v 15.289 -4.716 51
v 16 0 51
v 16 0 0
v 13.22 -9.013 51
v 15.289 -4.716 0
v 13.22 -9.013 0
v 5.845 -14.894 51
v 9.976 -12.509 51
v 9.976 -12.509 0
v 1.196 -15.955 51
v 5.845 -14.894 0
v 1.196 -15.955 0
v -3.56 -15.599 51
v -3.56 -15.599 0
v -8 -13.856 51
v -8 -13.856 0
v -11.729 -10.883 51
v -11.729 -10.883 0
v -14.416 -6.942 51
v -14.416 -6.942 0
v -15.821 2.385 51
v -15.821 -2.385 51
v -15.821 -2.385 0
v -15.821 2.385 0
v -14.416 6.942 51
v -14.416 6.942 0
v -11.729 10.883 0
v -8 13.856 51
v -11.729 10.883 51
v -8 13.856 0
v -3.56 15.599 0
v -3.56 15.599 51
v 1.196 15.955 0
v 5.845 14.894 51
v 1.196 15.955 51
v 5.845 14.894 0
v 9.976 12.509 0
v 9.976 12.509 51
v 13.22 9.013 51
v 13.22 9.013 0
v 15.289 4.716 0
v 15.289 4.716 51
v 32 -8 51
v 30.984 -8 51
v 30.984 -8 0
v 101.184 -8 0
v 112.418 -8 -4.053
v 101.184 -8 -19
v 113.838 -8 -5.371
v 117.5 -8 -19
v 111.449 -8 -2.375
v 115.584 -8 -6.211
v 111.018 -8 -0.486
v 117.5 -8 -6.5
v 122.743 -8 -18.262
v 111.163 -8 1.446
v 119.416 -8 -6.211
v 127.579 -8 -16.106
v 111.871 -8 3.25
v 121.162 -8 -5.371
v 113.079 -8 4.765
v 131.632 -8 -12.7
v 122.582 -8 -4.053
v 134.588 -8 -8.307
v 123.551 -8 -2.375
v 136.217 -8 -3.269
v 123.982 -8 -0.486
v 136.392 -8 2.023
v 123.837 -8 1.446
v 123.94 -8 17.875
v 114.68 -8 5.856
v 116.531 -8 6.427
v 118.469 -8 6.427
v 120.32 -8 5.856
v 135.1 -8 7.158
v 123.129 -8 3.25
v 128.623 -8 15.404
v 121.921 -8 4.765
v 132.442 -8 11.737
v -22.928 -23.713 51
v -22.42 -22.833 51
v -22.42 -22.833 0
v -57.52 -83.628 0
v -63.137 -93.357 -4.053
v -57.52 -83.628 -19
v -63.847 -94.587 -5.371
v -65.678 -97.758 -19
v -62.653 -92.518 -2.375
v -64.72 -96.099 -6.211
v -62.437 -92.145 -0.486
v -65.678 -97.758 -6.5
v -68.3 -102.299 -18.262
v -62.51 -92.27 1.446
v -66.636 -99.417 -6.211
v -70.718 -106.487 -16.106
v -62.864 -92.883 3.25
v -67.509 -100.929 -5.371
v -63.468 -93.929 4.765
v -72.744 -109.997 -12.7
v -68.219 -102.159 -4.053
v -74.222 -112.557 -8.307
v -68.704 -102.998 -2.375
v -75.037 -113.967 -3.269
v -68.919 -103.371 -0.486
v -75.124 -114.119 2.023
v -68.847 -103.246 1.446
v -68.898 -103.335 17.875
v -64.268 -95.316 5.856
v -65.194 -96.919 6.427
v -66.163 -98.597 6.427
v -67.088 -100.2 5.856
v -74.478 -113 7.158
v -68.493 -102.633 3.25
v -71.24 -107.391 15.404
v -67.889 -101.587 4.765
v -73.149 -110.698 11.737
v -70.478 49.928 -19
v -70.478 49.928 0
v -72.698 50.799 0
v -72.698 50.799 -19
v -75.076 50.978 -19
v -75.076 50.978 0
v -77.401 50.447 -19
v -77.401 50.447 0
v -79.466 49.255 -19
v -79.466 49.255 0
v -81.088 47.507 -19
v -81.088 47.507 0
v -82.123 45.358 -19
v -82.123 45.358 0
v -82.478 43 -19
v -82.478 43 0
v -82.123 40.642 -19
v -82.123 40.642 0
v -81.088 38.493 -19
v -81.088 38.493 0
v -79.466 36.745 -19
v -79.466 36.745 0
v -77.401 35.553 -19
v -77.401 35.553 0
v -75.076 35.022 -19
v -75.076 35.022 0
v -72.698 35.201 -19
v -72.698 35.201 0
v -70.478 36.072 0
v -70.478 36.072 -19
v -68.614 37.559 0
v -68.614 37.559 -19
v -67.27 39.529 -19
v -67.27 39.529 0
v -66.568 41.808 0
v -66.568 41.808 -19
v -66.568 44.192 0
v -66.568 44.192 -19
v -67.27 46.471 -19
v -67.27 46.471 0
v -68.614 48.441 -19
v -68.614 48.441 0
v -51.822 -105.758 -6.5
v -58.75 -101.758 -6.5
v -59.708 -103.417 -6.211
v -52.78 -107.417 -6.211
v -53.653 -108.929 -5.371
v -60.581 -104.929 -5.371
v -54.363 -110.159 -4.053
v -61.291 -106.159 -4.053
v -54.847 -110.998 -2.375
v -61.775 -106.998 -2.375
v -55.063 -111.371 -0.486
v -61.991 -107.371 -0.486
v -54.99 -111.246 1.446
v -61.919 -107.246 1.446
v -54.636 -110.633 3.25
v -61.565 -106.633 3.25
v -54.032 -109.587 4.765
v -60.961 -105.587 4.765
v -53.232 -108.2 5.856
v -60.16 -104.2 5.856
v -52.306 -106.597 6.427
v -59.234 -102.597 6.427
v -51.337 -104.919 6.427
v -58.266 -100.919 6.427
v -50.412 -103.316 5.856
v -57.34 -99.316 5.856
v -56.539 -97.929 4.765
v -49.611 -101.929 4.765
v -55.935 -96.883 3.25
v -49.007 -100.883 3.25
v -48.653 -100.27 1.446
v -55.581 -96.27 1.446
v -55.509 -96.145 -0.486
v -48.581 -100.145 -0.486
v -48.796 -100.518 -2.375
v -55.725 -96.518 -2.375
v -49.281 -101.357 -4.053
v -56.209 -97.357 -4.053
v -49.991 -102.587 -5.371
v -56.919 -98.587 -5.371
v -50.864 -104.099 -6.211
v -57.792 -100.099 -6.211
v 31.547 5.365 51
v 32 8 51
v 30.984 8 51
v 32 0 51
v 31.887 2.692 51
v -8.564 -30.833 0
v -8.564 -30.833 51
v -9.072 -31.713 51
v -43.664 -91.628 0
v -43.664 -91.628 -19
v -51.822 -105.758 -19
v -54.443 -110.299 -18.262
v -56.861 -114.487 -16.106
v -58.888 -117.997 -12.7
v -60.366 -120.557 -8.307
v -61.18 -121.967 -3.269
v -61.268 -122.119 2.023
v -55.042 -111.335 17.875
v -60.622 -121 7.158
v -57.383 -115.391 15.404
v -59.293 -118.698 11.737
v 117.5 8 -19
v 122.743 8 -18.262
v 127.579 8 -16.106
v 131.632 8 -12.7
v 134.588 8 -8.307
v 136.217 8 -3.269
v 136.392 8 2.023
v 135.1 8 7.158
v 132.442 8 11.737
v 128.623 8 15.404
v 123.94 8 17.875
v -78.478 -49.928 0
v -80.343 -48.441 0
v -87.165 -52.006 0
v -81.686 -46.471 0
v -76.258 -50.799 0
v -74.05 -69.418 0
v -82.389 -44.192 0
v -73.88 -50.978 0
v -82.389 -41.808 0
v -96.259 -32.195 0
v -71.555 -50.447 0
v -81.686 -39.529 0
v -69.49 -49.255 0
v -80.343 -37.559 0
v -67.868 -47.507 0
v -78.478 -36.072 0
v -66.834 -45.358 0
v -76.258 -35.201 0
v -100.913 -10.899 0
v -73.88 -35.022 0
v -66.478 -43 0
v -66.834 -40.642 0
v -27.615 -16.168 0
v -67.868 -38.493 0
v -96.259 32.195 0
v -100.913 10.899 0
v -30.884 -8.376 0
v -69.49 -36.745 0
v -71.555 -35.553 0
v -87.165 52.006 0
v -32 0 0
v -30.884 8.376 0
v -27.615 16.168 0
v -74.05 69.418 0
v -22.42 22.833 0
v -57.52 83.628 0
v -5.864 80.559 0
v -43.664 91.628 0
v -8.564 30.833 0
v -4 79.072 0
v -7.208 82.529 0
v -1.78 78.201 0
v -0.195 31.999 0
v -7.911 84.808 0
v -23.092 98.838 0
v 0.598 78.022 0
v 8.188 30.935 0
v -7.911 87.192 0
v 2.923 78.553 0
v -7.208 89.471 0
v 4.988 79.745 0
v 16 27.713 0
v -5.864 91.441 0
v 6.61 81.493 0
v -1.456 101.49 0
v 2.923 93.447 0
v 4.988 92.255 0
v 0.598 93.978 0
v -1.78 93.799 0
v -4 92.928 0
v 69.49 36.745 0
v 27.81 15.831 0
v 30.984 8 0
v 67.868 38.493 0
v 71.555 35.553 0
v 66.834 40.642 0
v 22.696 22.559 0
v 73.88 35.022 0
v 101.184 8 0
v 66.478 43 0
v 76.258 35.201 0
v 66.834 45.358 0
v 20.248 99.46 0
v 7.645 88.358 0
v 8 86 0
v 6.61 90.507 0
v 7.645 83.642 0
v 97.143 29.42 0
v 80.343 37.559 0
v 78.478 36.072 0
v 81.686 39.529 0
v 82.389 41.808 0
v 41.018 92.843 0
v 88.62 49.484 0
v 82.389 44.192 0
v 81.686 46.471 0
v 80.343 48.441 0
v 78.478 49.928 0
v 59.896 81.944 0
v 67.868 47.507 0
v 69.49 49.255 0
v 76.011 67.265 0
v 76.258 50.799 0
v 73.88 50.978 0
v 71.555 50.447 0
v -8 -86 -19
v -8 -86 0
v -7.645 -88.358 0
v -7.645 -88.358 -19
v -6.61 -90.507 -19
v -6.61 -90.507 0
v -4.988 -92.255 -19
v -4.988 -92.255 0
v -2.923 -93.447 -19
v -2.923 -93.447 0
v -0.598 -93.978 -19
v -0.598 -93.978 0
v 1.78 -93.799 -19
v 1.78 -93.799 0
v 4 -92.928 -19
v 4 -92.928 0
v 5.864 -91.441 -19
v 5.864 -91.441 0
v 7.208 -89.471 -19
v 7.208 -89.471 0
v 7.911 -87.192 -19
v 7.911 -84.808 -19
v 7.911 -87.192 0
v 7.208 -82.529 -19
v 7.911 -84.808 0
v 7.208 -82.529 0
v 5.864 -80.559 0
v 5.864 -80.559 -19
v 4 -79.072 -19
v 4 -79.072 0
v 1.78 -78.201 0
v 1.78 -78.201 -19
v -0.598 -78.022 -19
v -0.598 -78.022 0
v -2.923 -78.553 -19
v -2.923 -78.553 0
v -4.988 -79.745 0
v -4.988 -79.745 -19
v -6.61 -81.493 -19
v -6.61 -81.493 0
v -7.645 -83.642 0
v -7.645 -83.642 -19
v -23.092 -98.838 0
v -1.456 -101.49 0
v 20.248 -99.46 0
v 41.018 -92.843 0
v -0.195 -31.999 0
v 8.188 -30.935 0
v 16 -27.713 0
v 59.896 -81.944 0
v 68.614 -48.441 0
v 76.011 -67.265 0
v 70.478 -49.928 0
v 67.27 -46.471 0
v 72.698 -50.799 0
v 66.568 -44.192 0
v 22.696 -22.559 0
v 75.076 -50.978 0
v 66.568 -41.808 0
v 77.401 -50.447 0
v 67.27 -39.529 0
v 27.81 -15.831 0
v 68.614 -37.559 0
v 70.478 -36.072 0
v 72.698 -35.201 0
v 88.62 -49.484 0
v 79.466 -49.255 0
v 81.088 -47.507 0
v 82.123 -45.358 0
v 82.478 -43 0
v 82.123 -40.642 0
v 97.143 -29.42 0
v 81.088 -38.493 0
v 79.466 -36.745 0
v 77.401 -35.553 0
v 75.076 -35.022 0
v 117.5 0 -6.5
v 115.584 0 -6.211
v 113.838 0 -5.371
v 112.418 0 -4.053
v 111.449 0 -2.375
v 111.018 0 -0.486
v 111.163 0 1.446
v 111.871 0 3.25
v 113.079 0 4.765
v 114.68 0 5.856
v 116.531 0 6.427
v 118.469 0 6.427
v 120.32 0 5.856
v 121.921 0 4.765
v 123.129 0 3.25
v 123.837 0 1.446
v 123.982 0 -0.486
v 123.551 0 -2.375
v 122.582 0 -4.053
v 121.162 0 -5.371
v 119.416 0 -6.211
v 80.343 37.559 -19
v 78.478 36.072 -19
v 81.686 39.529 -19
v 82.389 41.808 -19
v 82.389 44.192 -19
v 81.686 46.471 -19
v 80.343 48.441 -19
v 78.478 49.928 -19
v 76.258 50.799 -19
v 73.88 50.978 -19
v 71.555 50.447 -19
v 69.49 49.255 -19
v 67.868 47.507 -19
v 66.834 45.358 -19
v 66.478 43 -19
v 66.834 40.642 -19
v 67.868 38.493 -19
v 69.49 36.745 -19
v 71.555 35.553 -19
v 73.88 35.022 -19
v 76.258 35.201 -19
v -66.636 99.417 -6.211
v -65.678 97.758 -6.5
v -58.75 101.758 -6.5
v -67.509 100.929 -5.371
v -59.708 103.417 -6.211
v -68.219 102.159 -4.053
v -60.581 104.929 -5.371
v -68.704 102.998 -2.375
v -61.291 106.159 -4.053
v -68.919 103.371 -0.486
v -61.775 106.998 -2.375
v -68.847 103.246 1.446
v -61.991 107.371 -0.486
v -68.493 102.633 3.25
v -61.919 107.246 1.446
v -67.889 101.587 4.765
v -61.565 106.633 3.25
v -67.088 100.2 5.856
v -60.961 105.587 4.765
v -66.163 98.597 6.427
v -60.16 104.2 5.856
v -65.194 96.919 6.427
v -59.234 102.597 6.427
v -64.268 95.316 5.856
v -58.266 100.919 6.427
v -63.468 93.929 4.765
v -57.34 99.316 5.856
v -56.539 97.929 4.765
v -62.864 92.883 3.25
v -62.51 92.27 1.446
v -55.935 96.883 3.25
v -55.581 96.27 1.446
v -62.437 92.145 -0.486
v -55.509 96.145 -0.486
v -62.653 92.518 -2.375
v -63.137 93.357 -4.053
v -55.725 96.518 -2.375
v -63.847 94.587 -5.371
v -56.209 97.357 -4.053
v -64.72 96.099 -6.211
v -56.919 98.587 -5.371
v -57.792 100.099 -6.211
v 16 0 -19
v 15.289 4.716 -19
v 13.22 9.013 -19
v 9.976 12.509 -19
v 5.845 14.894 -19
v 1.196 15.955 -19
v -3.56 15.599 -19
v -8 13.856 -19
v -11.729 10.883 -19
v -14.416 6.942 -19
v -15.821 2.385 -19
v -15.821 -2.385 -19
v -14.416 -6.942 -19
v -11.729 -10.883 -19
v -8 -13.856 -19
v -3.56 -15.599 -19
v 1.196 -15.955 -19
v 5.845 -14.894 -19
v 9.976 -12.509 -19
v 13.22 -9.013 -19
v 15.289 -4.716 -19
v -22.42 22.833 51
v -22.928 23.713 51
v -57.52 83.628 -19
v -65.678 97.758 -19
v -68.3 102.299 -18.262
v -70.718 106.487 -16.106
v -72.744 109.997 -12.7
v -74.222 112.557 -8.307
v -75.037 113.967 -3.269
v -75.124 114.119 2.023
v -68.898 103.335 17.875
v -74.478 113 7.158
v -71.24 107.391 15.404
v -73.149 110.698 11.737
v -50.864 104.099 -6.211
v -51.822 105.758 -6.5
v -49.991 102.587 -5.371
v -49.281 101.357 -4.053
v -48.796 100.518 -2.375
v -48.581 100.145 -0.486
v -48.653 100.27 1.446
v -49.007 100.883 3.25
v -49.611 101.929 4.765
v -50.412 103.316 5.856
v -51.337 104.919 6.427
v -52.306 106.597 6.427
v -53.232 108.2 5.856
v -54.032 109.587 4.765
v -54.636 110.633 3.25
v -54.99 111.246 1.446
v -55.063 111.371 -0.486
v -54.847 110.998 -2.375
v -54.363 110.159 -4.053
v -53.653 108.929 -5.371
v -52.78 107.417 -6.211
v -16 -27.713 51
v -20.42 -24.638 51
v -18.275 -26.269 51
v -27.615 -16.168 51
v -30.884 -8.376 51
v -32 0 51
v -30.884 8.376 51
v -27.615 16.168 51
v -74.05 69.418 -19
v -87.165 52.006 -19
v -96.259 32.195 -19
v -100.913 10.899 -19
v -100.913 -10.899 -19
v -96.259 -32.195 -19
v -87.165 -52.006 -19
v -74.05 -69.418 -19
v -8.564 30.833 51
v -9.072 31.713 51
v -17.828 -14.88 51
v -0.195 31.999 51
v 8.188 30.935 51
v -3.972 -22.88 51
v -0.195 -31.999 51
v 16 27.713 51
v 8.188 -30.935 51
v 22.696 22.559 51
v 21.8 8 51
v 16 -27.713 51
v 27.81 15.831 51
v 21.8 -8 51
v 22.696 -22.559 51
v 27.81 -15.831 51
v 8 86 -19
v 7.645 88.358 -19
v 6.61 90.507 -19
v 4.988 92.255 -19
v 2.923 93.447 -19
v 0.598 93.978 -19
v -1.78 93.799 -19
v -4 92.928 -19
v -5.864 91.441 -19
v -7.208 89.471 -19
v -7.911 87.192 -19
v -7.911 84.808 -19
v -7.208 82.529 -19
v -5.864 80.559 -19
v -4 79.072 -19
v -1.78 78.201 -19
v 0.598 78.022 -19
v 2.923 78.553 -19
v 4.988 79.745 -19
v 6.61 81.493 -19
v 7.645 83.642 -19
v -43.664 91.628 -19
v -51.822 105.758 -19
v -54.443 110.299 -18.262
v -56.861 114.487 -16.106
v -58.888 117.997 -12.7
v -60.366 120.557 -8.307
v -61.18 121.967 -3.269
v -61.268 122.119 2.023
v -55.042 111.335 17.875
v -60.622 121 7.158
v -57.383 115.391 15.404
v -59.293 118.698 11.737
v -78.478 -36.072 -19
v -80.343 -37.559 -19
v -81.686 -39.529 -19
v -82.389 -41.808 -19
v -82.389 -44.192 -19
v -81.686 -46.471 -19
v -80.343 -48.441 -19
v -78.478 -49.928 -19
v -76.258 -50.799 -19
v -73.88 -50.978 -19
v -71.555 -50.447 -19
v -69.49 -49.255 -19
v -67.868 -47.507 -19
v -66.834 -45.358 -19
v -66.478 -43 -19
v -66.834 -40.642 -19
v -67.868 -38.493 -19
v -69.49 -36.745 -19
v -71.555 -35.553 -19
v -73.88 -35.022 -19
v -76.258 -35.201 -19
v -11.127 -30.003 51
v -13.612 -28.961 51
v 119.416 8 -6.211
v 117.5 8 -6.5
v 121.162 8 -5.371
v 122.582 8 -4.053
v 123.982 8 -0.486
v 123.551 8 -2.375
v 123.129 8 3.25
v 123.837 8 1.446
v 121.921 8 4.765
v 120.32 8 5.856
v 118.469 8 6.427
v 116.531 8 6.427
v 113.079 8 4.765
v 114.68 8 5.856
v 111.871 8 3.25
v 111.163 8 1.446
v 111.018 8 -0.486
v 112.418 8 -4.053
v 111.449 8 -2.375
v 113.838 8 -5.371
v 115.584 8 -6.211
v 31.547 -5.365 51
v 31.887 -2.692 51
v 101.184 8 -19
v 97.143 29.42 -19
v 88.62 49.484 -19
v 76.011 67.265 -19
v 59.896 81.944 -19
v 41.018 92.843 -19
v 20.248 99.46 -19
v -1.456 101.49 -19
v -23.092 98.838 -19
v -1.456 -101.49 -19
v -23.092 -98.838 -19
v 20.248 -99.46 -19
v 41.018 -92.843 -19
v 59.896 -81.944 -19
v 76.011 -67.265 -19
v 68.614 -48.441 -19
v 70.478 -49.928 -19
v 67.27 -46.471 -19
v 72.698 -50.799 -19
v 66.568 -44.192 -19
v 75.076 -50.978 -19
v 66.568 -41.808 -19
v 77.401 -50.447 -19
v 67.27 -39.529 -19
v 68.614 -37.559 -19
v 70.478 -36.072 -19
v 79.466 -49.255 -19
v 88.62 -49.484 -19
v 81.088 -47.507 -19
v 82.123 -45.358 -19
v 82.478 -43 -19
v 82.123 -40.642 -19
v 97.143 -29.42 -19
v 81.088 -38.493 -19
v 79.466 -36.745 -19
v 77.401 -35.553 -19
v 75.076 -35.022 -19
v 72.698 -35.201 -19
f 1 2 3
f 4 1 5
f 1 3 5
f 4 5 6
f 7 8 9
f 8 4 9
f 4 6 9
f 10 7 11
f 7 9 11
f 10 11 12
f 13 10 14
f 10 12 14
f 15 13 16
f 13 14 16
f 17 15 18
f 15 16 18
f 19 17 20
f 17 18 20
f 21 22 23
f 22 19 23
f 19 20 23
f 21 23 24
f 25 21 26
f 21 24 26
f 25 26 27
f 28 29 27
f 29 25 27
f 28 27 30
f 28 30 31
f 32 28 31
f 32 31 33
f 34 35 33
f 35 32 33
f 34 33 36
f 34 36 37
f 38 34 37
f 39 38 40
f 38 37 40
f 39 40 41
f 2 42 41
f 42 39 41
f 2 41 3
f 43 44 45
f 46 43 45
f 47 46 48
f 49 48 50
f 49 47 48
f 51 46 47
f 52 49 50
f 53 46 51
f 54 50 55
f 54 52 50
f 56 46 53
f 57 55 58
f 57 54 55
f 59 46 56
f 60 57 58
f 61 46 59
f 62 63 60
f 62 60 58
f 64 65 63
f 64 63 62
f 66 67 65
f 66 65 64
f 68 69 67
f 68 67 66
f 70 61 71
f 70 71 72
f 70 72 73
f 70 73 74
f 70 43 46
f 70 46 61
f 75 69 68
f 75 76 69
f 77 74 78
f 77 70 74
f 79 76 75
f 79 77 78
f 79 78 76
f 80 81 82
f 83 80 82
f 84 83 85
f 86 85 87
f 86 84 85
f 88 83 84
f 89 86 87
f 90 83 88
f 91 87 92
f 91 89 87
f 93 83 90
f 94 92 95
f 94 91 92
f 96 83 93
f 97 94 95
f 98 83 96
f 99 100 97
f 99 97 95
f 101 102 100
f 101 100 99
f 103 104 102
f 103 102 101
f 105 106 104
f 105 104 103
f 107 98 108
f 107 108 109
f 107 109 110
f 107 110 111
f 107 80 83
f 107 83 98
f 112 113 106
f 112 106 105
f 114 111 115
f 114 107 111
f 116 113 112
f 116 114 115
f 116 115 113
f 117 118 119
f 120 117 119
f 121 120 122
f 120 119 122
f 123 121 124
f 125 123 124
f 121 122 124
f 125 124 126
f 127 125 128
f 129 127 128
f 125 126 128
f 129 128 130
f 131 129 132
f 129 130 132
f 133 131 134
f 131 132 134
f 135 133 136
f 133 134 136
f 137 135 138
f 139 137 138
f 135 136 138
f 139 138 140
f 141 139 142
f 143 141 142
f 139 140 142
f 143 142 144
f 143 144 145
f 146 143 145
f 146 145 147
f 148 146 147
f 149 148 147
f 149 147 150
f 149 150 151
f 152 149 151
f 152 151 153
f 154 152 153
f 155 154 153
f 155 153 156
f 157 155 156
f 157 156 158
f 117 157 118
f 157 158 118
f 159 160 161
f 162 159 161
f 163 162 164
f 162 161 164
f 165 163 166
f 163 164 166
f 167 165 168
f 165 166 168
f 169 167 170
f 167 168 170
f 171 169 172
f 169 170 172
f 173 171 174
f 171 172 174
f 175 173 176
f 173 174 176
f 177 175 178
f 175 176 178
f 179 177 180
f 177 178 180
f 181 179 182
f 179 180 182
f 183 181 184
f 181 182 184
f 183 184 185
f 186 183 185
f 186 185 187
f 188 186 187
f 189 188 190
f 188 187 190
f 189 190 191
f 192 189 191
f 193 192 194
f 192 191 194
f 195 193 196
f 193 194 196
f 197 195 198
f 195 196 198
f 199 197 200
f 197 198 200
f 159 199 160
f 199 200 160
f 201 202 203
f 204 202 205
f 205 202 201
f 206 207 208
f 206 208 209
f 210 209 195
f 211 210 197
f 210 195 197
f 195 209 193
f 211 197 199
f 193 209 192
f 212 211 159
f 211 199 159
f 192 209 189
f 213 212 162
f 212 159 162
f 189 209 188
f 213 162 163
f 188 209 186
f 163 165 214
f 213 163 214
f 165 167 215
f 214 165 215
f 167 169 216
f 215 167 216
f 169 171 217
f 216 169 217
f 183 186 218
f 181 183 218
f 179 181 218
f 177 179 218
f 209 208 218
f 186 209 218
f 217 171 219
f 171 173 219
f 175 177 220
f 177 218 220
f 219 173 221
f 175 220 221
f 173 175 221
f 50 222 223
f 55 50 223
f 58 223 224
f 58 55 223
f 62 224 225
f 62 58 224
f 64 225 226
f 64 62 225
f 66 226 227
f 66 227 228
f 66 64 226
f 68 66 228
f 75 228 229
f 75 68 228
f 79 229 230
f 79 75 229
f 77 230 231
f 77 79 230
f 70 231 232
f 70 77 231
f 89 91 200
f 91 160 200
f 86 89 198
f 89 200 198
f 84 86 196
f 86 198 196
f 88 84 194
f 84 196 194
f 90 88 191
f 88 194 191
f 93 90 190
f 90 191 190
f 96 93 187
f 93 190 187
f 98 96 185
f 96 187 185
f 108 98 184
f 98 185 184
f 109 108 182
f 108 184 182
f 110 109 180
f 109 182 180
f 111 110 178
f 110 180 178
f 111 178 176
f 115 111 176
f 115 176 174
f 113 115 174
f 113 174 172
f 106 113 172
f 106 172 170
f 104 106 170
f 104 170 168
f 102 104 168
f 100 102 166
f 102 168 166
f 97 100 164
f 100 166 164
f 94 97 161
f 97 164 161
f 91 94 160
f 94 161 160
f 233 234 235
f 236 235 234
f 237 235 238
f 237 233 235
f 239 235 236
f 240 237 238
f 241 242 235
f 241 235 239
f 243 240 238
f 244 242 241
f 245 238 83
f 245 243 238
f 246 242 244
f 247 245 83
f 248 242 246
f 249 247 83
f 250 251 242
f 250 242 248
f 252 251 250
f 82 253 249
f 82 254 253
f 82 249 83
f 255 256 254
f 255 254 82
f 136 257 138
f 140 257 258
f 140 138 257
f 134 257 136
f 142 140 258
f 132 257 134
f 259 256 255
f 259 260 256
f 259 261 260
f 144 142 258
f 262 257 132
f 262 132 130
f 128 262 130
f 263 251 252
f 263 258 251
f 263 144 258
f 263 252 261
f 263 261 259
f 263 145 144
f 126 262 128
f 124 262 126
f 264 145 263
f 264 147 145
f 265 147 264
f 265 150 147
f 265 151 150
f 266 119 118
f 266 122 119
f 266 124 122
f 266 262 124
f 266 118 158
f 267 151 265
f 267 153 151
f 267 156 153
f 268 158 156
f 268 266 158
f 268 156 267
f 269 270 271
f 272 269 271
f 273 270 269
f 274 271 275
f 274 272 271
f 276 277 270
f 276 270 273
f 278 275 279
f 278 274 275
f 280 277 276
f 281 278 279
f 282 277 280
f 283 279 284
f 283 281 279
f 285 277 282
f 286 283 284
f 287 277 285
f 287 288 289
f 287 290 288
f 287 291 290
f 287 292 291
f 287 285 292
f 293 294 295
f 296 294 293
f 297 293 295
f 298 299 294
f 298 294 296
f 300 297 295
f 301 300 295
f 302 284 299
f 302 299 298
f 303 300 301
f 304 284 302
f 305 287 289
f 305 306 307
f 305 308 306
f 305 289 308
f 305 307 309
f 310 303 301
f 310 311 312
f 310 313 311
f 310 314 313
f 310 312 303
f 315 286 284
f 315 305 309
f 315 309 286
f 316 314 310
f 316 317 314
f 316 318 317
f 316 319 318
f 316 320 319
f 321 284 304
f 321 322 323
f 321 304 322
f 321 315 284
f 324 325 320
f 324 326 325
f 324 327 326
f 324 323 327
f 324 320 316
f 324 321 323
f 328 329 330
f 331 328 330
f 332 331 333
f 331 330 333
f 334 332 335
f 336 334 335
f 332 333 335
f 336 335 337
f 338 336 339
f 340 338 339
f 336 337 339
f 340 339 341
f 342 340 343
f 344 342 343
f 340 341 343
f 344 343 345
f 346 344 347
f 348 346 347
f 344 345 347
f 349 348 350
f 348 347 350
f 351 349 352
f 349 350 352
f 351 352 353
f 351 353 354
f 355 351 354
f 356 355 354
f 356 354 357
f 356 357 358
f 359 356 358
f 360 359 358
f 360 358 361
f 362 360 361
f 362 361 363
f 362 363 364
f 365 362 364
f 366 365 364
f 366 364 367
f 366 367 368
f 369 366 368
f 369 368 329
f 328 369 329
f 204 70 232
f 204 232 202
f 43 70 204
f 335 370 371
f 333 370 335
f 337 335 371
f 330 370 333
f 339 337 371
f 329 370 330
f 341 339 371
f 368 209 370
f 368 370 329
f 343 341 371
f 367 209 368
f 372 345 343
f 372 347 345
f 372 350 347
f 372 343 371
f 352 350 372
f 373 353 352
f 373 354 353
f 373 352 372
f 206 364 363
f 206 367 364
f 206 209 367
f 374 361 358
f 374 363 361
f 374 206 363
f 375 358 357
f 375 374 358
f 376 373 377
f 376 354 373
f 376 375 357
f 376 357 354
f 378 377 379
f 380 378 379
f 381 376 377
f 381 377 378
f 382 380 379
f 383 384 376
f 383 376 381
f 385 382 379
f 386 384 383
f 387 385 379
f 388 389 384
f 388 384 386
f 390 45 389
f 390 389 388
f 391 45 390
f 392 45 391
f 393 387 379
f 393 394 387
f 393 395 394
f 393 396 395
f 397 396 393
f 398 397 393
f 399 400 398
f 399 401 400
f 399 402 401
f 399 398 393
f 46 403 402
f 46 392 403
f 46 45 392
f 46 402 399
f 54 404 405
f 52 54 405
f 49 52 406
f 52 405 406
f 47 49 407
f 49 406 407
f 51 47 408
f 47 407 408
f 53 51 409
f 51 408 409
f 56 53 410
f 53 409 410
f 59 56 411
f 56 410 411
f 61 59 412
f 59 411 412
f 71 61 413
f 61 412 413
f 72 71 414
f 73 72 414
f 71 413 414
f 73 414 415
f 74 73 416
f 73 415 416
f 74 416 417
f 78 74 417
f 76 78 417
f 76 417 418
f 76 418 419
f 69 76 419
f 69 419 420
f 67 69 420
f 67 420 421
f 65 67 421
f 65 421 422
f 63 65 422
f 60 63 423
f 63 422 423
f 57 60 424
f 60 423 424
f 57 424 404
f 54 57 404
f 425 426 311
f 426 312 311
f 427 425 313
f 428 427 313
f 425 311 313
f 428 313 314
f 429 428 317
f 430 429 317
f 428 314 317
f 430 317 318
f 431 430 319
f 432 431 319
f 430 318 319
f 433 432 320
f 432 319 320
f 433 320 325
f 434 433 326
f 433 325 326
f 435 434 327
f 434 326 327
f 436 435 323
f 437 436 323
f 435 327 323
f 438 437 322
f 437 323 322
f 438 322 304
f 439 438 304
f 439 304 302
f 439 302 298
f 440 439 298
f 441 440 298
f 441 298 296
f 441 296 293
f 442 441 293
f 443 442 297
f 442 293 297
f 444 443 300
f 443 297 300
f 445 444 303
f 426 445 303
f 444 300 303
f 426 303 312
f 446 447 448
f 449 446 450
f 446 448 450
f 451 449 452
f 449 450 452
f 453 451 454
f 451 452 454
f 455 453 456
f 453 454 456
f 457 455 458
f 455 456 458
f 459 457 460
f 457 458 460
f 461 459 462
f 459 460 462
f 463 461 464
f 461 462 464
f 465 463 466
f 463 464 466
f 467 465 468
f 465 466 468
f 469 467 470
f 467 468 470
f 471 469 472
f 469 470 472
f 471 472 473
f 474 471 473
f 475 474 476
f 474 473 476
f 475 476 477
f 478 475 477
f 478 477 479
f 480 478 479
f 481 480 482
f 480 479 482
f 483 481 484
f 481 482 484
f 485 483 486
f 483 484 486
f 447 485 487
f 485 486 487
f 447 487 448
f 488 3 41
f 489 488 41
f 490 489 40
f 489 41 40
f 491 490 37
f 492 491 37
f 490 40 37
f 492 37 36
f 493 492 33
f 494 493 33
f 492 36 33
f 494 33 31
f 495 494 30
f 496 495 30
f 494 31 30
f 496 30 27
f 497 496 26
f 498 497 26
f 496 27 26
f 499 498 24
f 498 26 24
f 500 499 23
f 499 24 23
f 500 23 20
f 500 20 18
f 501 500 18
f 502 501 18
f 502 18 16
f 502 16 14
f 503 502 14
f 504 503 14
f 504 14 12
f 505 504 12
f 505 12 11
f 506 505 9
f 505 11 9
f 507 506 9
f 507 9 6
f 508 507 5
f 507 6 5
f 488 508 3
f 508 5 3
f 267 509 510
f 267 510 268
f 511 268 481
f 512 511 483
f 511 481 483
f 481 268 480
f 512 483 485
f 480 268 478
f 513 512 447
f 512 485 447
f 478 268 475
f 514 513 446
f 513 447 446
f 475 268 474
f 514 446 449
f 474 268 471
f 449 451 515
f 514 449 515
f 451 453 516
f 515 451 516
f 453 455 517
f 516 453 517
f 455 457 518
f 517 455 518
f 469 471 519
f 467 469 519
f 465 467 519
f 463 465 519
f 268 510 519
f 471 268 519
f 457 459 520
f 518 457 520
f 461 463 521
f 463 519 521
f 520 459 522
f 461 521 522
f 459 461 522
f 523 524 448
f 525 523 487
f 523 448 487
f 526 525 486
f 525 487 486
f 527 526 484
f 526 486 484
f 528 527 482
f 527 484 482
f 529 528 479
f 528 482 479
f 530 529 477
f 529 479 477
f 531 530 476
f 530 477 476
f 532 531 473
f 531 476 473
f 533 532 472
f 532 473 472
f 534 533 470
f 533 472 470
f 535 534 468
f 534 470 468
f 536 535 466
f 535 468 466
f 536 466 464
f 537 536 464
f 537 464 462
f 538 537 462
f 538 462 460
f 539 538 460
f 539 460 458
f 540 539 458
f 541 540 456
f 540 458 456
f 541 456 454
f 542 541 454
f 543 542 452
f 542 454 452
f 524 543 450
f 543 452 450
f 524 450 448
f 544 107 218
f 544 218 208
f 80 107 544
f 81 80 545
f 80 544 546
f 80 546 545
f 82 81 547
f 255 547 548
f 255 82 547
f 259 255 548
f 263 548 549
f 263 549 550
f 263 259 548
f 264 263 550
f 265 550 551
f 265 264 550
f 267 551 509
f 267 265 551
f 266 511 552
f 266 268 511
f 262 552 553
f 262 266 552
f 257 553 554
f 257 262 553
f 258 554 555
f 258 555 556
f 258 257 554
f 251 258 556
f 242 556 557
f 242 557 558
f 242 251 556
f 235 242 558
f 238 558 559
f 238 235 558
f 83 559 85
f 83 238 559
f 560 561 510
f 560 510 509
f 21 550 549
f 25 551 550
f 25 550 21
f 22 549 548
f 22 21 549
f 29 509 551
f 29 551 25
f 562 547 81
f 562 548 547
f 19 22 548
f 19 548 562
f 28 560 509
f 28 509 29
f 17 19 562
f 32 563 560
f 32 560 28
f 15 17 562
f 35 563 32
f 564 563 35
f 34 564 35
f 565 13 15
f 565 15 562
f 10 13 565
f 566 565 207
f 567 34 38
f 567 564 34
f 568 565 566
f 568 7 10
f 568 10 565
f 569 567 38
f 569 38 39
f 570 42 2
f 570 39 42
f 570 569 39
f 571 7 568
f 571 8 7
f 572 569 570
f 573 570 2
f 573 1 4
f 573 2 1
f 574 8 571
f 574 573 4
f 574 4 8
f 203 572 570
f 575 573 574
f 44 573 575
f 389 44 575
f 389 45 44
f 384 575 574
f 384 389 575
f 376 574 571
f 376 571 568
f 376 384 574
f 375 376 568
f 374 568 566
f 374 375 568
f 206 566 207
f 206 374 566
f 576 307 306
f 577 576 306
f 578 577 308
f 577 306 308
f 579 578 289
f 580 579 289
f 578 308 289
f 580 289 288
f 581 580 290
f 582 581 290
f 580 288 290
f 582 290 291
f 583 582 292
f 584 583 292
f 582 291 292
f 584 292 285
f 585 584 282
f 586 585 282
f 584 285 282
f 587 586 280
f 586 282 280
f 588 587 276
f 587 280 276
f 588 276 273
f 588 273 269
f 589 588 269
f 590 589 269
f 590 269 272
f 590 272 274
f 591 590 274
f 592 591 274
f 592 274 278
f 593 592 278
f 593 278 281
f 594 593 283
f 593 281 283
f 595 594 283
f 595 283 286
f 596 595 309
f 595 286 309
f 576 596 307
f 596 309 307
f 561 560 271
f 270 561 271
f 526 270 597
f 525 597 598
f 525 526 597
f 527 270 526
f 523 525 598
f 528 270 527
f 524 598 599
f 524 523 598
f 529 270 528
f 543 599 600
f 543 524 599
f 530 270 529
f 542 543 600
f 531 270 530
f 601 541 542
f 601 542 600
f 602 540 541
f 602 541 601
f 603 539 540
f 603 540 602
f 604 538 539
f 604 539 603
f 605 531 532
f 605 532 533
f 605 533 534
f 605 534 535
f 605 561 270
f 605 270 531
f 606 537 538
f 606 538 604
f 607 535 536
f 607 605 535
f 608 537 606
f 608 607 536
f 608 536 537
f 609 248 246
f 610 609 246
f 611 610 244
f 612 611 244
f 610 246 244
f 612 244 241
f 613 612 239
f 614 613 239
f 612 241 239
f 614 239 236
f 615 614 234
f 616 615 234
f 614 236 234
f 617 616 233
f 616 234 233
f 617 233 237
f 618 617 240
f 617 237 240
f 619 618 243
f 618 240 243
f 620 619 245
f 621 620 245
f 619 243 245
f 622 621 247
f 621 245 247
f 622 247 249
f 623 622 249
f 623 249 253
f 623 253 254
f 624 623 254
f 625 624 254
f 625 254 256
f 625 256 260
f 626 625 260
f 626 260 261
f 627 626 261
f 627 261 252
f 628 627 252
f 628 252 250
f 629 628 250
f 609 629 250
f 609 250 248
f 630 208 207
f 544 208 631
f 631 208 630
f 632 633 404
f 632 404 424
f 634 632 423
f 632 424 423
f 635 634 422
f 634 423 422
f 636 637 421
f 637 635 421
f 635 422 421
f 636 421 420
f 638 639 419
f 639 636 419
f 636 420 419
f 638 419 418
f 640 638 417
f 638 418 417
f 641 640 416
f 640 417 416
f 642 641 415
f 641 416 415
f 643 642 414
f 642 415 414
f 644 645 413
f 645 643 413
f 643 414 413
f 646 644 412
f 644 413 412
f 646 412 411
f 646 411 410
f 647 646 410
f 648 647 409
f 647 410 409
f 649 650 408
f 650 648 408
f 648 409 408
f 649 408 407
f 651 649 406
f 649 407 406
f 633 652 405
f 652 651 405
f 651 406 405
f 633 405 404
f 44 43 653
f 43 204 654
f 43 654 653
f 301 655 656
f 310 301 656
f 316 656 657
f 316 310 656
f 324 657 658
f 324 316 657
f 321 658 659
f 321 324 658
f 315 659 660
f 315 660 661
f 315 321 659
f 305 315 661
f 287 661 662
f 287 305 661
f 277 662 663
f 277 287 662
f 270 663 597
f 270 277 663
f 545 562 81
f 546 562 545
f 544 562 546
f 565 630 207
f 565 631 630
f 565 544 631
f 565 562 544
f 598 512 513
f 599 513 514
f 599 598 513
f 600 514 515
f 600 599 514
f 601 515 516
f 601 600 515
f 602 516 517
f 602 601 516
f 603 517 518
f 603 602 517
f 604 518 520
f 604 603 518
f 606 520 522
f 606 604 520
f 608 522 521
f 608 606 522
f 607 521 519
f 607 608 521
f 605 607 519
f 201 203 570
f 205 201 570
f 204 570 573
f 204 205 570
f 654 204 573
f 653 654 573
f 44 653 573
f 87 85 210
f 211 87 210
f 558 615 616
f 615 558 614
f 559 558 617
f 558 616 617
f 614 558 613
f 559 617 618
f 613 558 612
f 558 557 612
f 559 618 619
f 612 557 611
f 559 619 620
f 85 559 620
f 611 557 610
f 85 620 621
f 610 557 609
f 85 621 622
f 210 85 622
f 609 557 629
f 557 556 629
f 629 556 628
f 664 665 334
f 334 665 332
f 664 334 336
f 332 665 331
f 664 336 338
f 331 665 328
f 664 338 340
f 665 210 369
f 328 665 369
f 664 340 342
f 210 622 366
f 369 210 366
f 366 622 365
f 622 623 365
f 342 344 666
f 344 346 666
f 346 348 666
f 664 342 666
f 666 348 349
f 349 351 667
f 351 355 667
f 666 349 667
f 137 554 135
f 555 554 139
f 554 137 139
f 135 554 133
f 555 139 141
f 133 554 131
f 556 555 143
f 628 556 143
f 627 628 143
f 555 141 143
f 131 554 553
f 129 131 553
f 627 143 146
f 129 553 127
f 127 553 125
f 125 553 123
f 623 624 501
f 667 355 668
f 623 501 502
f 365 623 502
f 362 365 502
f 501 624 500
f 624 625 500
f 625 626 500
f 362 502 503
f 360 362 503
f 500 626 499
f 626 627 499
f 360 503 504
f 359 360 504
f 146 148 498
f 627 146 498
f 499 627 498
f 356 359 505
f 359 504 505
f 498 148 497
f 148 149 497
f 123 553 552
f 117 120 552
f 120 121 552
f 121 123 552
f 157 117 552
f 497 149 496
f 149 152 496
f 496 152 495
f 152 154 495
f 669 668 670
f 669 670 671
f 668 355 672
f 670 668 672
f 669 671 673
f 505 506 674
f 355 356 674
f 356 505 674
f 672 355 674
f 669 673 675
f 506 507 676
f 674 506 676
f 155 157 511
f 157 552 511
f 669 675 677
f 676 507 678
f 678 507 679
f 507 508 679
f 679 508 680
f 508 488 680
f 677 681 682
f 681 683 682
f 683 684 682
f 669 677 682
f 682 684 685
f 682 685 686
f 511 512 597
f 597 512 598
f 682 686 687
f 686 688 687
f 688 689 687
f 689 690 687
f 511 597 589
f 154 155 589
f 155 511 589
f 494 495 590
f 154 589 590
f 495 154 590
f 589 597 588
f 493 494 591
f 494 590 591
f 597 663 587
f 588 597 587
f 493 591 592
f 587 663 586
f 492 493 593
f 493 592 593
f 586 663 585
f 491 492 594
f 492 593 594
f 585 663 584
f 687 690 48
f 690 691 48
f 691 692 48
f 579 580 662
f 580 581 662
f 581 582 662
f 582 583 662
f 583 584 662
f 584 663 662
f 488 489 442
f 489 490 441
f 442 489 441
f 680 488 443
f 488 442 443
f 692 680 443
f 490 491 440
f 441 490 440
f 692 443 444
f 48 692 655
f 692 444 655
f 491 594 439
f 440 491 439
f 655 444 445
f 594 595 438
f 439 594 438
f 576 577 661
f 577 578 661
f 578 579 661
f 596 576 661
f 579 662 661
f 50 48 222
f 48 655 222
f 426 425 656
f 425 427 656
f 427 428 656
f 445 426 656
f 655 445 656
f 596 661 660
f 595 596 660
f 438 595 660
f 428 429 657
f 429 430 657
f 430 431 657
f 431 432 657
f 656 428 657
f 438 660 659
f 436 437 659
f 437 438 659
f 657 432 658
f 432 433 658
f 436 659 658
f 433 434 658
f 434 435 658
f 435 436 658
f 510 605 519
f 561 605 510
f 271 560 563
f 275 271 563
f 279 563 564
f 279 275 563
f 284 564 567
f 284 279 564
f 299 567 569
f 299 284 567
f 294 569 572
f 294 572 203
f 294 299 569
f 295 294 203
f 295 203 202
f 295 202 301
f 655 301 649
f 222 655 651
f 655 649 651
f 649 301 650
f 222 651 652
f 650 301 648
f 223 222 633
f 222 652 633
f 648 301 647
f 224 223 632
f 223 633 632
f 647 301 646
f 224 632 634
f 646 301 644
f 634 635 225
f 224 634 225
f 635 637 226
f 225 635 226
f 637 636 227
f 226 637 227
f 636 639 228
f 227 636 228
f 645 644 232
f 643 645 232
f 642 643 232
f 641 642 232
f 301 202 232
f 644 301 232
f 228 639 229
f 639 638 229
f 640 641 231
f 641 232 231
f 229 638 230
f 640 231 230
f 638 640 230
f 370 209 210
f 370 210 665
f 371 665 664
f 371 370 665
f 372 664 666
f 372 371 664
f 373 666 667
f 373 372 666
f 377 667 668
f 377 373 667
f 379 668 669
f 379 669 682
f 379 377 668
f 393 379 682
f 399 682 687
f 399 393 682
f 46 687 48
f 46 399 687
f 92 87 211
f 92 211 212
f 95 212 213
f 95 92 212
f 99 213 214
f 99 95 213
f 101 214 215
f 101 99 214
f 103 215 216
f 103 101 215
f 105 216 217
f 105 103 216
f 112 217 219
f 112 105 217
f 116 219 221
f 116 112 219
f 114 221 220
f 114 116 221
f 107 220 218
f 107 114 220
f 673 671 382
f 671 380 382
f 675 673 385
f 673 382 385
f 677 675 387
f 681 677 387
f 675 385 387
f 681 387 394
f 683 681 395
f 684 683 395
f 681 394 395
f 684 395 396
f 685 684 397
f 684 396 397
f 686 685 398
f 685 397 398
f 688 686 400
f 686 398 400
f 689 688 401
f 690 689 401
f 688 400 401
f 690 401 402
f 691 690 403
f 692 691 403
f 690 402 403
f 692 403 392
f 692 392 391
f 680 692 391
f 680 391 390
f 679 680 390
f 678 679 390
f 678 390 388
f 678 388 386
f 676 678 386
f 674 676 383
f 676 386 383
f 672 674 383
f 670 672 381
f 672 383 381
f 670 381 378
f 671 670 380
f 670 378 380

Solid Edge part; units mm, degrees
sketch "Sketch1" plane through (0, 0, 0) normal (0, 0, 1) x (1, 0, 0)
  circle A0 centre (0, 0) radius 101.5
extrude "Protrusion1" add sketch "Sketch1" against normal blind 19
sketch "Sketch2" plane through (0, 0, 0) normal (0, 0, 1) x (1, 0, 0)
  circle A0 centre (0, 0) radius 32
extrude "ExtrudedProtrusion_2" add sketch "Sketch2" along normal blind 51
sketch "Sketch3" plane through (0, 0, 0) normal (0, 0, 1) x (1, 0, 0)
  circle A0 centre (0, 0) radius 16
extrude "ExtrudedCutout_1" cut sketch "Sketch3" along normal blind 51 and the other way blind 19
sketch "Sketch4" plane through (0, 0, 0) normal (0, 0, 1) x (1, 0, 0)
  circle A0 centre (0, 86) radius 8
extrude "ExtrudedCutout_2" cut sketch "Sketch4" against normal blind 19
pattern_circular "Pattern1" count 6 over 360 about axis through (0, 0, 0) along (0, 0, -1) of "ExtrudedCutout_2"
sketch "Sketch5" plane through (0, 0, 0) normal (-0.866, -0.5, 0) x (0, 0, -1)
  line L0 (-17.8752, -123.9402) -> (-51, -32)
  line L1 (-51, -32) -> (-51, -21.8003)
  line L2 (19, -21.8003) -> (-51, -21.8003)
  line L3 (19, -117.5) -> (19, -21.8003)
  arc A0 (19, -117.5) -> (-17.8752, -123.9402) centre (0, -117.5) cw
extrude "Protrusion_3" add sketch "Sketch5" along normal mid plane 16
sketch "Sketch6" plane through (0, 0, 0) normal (-0.866, -0.5, 0) x (0, 0, -1)
  circle A0 centre (0, -117.5) radius 6.5
extrude "Cutout_3" cut sketch "Sketch6" along normal mid plane 16
pattern_circular "Pattern2" count 3 over 360 about axis through (0, 0, 0) along (0, 0, -1) of "Protrusion_3", "Cutout_3"
